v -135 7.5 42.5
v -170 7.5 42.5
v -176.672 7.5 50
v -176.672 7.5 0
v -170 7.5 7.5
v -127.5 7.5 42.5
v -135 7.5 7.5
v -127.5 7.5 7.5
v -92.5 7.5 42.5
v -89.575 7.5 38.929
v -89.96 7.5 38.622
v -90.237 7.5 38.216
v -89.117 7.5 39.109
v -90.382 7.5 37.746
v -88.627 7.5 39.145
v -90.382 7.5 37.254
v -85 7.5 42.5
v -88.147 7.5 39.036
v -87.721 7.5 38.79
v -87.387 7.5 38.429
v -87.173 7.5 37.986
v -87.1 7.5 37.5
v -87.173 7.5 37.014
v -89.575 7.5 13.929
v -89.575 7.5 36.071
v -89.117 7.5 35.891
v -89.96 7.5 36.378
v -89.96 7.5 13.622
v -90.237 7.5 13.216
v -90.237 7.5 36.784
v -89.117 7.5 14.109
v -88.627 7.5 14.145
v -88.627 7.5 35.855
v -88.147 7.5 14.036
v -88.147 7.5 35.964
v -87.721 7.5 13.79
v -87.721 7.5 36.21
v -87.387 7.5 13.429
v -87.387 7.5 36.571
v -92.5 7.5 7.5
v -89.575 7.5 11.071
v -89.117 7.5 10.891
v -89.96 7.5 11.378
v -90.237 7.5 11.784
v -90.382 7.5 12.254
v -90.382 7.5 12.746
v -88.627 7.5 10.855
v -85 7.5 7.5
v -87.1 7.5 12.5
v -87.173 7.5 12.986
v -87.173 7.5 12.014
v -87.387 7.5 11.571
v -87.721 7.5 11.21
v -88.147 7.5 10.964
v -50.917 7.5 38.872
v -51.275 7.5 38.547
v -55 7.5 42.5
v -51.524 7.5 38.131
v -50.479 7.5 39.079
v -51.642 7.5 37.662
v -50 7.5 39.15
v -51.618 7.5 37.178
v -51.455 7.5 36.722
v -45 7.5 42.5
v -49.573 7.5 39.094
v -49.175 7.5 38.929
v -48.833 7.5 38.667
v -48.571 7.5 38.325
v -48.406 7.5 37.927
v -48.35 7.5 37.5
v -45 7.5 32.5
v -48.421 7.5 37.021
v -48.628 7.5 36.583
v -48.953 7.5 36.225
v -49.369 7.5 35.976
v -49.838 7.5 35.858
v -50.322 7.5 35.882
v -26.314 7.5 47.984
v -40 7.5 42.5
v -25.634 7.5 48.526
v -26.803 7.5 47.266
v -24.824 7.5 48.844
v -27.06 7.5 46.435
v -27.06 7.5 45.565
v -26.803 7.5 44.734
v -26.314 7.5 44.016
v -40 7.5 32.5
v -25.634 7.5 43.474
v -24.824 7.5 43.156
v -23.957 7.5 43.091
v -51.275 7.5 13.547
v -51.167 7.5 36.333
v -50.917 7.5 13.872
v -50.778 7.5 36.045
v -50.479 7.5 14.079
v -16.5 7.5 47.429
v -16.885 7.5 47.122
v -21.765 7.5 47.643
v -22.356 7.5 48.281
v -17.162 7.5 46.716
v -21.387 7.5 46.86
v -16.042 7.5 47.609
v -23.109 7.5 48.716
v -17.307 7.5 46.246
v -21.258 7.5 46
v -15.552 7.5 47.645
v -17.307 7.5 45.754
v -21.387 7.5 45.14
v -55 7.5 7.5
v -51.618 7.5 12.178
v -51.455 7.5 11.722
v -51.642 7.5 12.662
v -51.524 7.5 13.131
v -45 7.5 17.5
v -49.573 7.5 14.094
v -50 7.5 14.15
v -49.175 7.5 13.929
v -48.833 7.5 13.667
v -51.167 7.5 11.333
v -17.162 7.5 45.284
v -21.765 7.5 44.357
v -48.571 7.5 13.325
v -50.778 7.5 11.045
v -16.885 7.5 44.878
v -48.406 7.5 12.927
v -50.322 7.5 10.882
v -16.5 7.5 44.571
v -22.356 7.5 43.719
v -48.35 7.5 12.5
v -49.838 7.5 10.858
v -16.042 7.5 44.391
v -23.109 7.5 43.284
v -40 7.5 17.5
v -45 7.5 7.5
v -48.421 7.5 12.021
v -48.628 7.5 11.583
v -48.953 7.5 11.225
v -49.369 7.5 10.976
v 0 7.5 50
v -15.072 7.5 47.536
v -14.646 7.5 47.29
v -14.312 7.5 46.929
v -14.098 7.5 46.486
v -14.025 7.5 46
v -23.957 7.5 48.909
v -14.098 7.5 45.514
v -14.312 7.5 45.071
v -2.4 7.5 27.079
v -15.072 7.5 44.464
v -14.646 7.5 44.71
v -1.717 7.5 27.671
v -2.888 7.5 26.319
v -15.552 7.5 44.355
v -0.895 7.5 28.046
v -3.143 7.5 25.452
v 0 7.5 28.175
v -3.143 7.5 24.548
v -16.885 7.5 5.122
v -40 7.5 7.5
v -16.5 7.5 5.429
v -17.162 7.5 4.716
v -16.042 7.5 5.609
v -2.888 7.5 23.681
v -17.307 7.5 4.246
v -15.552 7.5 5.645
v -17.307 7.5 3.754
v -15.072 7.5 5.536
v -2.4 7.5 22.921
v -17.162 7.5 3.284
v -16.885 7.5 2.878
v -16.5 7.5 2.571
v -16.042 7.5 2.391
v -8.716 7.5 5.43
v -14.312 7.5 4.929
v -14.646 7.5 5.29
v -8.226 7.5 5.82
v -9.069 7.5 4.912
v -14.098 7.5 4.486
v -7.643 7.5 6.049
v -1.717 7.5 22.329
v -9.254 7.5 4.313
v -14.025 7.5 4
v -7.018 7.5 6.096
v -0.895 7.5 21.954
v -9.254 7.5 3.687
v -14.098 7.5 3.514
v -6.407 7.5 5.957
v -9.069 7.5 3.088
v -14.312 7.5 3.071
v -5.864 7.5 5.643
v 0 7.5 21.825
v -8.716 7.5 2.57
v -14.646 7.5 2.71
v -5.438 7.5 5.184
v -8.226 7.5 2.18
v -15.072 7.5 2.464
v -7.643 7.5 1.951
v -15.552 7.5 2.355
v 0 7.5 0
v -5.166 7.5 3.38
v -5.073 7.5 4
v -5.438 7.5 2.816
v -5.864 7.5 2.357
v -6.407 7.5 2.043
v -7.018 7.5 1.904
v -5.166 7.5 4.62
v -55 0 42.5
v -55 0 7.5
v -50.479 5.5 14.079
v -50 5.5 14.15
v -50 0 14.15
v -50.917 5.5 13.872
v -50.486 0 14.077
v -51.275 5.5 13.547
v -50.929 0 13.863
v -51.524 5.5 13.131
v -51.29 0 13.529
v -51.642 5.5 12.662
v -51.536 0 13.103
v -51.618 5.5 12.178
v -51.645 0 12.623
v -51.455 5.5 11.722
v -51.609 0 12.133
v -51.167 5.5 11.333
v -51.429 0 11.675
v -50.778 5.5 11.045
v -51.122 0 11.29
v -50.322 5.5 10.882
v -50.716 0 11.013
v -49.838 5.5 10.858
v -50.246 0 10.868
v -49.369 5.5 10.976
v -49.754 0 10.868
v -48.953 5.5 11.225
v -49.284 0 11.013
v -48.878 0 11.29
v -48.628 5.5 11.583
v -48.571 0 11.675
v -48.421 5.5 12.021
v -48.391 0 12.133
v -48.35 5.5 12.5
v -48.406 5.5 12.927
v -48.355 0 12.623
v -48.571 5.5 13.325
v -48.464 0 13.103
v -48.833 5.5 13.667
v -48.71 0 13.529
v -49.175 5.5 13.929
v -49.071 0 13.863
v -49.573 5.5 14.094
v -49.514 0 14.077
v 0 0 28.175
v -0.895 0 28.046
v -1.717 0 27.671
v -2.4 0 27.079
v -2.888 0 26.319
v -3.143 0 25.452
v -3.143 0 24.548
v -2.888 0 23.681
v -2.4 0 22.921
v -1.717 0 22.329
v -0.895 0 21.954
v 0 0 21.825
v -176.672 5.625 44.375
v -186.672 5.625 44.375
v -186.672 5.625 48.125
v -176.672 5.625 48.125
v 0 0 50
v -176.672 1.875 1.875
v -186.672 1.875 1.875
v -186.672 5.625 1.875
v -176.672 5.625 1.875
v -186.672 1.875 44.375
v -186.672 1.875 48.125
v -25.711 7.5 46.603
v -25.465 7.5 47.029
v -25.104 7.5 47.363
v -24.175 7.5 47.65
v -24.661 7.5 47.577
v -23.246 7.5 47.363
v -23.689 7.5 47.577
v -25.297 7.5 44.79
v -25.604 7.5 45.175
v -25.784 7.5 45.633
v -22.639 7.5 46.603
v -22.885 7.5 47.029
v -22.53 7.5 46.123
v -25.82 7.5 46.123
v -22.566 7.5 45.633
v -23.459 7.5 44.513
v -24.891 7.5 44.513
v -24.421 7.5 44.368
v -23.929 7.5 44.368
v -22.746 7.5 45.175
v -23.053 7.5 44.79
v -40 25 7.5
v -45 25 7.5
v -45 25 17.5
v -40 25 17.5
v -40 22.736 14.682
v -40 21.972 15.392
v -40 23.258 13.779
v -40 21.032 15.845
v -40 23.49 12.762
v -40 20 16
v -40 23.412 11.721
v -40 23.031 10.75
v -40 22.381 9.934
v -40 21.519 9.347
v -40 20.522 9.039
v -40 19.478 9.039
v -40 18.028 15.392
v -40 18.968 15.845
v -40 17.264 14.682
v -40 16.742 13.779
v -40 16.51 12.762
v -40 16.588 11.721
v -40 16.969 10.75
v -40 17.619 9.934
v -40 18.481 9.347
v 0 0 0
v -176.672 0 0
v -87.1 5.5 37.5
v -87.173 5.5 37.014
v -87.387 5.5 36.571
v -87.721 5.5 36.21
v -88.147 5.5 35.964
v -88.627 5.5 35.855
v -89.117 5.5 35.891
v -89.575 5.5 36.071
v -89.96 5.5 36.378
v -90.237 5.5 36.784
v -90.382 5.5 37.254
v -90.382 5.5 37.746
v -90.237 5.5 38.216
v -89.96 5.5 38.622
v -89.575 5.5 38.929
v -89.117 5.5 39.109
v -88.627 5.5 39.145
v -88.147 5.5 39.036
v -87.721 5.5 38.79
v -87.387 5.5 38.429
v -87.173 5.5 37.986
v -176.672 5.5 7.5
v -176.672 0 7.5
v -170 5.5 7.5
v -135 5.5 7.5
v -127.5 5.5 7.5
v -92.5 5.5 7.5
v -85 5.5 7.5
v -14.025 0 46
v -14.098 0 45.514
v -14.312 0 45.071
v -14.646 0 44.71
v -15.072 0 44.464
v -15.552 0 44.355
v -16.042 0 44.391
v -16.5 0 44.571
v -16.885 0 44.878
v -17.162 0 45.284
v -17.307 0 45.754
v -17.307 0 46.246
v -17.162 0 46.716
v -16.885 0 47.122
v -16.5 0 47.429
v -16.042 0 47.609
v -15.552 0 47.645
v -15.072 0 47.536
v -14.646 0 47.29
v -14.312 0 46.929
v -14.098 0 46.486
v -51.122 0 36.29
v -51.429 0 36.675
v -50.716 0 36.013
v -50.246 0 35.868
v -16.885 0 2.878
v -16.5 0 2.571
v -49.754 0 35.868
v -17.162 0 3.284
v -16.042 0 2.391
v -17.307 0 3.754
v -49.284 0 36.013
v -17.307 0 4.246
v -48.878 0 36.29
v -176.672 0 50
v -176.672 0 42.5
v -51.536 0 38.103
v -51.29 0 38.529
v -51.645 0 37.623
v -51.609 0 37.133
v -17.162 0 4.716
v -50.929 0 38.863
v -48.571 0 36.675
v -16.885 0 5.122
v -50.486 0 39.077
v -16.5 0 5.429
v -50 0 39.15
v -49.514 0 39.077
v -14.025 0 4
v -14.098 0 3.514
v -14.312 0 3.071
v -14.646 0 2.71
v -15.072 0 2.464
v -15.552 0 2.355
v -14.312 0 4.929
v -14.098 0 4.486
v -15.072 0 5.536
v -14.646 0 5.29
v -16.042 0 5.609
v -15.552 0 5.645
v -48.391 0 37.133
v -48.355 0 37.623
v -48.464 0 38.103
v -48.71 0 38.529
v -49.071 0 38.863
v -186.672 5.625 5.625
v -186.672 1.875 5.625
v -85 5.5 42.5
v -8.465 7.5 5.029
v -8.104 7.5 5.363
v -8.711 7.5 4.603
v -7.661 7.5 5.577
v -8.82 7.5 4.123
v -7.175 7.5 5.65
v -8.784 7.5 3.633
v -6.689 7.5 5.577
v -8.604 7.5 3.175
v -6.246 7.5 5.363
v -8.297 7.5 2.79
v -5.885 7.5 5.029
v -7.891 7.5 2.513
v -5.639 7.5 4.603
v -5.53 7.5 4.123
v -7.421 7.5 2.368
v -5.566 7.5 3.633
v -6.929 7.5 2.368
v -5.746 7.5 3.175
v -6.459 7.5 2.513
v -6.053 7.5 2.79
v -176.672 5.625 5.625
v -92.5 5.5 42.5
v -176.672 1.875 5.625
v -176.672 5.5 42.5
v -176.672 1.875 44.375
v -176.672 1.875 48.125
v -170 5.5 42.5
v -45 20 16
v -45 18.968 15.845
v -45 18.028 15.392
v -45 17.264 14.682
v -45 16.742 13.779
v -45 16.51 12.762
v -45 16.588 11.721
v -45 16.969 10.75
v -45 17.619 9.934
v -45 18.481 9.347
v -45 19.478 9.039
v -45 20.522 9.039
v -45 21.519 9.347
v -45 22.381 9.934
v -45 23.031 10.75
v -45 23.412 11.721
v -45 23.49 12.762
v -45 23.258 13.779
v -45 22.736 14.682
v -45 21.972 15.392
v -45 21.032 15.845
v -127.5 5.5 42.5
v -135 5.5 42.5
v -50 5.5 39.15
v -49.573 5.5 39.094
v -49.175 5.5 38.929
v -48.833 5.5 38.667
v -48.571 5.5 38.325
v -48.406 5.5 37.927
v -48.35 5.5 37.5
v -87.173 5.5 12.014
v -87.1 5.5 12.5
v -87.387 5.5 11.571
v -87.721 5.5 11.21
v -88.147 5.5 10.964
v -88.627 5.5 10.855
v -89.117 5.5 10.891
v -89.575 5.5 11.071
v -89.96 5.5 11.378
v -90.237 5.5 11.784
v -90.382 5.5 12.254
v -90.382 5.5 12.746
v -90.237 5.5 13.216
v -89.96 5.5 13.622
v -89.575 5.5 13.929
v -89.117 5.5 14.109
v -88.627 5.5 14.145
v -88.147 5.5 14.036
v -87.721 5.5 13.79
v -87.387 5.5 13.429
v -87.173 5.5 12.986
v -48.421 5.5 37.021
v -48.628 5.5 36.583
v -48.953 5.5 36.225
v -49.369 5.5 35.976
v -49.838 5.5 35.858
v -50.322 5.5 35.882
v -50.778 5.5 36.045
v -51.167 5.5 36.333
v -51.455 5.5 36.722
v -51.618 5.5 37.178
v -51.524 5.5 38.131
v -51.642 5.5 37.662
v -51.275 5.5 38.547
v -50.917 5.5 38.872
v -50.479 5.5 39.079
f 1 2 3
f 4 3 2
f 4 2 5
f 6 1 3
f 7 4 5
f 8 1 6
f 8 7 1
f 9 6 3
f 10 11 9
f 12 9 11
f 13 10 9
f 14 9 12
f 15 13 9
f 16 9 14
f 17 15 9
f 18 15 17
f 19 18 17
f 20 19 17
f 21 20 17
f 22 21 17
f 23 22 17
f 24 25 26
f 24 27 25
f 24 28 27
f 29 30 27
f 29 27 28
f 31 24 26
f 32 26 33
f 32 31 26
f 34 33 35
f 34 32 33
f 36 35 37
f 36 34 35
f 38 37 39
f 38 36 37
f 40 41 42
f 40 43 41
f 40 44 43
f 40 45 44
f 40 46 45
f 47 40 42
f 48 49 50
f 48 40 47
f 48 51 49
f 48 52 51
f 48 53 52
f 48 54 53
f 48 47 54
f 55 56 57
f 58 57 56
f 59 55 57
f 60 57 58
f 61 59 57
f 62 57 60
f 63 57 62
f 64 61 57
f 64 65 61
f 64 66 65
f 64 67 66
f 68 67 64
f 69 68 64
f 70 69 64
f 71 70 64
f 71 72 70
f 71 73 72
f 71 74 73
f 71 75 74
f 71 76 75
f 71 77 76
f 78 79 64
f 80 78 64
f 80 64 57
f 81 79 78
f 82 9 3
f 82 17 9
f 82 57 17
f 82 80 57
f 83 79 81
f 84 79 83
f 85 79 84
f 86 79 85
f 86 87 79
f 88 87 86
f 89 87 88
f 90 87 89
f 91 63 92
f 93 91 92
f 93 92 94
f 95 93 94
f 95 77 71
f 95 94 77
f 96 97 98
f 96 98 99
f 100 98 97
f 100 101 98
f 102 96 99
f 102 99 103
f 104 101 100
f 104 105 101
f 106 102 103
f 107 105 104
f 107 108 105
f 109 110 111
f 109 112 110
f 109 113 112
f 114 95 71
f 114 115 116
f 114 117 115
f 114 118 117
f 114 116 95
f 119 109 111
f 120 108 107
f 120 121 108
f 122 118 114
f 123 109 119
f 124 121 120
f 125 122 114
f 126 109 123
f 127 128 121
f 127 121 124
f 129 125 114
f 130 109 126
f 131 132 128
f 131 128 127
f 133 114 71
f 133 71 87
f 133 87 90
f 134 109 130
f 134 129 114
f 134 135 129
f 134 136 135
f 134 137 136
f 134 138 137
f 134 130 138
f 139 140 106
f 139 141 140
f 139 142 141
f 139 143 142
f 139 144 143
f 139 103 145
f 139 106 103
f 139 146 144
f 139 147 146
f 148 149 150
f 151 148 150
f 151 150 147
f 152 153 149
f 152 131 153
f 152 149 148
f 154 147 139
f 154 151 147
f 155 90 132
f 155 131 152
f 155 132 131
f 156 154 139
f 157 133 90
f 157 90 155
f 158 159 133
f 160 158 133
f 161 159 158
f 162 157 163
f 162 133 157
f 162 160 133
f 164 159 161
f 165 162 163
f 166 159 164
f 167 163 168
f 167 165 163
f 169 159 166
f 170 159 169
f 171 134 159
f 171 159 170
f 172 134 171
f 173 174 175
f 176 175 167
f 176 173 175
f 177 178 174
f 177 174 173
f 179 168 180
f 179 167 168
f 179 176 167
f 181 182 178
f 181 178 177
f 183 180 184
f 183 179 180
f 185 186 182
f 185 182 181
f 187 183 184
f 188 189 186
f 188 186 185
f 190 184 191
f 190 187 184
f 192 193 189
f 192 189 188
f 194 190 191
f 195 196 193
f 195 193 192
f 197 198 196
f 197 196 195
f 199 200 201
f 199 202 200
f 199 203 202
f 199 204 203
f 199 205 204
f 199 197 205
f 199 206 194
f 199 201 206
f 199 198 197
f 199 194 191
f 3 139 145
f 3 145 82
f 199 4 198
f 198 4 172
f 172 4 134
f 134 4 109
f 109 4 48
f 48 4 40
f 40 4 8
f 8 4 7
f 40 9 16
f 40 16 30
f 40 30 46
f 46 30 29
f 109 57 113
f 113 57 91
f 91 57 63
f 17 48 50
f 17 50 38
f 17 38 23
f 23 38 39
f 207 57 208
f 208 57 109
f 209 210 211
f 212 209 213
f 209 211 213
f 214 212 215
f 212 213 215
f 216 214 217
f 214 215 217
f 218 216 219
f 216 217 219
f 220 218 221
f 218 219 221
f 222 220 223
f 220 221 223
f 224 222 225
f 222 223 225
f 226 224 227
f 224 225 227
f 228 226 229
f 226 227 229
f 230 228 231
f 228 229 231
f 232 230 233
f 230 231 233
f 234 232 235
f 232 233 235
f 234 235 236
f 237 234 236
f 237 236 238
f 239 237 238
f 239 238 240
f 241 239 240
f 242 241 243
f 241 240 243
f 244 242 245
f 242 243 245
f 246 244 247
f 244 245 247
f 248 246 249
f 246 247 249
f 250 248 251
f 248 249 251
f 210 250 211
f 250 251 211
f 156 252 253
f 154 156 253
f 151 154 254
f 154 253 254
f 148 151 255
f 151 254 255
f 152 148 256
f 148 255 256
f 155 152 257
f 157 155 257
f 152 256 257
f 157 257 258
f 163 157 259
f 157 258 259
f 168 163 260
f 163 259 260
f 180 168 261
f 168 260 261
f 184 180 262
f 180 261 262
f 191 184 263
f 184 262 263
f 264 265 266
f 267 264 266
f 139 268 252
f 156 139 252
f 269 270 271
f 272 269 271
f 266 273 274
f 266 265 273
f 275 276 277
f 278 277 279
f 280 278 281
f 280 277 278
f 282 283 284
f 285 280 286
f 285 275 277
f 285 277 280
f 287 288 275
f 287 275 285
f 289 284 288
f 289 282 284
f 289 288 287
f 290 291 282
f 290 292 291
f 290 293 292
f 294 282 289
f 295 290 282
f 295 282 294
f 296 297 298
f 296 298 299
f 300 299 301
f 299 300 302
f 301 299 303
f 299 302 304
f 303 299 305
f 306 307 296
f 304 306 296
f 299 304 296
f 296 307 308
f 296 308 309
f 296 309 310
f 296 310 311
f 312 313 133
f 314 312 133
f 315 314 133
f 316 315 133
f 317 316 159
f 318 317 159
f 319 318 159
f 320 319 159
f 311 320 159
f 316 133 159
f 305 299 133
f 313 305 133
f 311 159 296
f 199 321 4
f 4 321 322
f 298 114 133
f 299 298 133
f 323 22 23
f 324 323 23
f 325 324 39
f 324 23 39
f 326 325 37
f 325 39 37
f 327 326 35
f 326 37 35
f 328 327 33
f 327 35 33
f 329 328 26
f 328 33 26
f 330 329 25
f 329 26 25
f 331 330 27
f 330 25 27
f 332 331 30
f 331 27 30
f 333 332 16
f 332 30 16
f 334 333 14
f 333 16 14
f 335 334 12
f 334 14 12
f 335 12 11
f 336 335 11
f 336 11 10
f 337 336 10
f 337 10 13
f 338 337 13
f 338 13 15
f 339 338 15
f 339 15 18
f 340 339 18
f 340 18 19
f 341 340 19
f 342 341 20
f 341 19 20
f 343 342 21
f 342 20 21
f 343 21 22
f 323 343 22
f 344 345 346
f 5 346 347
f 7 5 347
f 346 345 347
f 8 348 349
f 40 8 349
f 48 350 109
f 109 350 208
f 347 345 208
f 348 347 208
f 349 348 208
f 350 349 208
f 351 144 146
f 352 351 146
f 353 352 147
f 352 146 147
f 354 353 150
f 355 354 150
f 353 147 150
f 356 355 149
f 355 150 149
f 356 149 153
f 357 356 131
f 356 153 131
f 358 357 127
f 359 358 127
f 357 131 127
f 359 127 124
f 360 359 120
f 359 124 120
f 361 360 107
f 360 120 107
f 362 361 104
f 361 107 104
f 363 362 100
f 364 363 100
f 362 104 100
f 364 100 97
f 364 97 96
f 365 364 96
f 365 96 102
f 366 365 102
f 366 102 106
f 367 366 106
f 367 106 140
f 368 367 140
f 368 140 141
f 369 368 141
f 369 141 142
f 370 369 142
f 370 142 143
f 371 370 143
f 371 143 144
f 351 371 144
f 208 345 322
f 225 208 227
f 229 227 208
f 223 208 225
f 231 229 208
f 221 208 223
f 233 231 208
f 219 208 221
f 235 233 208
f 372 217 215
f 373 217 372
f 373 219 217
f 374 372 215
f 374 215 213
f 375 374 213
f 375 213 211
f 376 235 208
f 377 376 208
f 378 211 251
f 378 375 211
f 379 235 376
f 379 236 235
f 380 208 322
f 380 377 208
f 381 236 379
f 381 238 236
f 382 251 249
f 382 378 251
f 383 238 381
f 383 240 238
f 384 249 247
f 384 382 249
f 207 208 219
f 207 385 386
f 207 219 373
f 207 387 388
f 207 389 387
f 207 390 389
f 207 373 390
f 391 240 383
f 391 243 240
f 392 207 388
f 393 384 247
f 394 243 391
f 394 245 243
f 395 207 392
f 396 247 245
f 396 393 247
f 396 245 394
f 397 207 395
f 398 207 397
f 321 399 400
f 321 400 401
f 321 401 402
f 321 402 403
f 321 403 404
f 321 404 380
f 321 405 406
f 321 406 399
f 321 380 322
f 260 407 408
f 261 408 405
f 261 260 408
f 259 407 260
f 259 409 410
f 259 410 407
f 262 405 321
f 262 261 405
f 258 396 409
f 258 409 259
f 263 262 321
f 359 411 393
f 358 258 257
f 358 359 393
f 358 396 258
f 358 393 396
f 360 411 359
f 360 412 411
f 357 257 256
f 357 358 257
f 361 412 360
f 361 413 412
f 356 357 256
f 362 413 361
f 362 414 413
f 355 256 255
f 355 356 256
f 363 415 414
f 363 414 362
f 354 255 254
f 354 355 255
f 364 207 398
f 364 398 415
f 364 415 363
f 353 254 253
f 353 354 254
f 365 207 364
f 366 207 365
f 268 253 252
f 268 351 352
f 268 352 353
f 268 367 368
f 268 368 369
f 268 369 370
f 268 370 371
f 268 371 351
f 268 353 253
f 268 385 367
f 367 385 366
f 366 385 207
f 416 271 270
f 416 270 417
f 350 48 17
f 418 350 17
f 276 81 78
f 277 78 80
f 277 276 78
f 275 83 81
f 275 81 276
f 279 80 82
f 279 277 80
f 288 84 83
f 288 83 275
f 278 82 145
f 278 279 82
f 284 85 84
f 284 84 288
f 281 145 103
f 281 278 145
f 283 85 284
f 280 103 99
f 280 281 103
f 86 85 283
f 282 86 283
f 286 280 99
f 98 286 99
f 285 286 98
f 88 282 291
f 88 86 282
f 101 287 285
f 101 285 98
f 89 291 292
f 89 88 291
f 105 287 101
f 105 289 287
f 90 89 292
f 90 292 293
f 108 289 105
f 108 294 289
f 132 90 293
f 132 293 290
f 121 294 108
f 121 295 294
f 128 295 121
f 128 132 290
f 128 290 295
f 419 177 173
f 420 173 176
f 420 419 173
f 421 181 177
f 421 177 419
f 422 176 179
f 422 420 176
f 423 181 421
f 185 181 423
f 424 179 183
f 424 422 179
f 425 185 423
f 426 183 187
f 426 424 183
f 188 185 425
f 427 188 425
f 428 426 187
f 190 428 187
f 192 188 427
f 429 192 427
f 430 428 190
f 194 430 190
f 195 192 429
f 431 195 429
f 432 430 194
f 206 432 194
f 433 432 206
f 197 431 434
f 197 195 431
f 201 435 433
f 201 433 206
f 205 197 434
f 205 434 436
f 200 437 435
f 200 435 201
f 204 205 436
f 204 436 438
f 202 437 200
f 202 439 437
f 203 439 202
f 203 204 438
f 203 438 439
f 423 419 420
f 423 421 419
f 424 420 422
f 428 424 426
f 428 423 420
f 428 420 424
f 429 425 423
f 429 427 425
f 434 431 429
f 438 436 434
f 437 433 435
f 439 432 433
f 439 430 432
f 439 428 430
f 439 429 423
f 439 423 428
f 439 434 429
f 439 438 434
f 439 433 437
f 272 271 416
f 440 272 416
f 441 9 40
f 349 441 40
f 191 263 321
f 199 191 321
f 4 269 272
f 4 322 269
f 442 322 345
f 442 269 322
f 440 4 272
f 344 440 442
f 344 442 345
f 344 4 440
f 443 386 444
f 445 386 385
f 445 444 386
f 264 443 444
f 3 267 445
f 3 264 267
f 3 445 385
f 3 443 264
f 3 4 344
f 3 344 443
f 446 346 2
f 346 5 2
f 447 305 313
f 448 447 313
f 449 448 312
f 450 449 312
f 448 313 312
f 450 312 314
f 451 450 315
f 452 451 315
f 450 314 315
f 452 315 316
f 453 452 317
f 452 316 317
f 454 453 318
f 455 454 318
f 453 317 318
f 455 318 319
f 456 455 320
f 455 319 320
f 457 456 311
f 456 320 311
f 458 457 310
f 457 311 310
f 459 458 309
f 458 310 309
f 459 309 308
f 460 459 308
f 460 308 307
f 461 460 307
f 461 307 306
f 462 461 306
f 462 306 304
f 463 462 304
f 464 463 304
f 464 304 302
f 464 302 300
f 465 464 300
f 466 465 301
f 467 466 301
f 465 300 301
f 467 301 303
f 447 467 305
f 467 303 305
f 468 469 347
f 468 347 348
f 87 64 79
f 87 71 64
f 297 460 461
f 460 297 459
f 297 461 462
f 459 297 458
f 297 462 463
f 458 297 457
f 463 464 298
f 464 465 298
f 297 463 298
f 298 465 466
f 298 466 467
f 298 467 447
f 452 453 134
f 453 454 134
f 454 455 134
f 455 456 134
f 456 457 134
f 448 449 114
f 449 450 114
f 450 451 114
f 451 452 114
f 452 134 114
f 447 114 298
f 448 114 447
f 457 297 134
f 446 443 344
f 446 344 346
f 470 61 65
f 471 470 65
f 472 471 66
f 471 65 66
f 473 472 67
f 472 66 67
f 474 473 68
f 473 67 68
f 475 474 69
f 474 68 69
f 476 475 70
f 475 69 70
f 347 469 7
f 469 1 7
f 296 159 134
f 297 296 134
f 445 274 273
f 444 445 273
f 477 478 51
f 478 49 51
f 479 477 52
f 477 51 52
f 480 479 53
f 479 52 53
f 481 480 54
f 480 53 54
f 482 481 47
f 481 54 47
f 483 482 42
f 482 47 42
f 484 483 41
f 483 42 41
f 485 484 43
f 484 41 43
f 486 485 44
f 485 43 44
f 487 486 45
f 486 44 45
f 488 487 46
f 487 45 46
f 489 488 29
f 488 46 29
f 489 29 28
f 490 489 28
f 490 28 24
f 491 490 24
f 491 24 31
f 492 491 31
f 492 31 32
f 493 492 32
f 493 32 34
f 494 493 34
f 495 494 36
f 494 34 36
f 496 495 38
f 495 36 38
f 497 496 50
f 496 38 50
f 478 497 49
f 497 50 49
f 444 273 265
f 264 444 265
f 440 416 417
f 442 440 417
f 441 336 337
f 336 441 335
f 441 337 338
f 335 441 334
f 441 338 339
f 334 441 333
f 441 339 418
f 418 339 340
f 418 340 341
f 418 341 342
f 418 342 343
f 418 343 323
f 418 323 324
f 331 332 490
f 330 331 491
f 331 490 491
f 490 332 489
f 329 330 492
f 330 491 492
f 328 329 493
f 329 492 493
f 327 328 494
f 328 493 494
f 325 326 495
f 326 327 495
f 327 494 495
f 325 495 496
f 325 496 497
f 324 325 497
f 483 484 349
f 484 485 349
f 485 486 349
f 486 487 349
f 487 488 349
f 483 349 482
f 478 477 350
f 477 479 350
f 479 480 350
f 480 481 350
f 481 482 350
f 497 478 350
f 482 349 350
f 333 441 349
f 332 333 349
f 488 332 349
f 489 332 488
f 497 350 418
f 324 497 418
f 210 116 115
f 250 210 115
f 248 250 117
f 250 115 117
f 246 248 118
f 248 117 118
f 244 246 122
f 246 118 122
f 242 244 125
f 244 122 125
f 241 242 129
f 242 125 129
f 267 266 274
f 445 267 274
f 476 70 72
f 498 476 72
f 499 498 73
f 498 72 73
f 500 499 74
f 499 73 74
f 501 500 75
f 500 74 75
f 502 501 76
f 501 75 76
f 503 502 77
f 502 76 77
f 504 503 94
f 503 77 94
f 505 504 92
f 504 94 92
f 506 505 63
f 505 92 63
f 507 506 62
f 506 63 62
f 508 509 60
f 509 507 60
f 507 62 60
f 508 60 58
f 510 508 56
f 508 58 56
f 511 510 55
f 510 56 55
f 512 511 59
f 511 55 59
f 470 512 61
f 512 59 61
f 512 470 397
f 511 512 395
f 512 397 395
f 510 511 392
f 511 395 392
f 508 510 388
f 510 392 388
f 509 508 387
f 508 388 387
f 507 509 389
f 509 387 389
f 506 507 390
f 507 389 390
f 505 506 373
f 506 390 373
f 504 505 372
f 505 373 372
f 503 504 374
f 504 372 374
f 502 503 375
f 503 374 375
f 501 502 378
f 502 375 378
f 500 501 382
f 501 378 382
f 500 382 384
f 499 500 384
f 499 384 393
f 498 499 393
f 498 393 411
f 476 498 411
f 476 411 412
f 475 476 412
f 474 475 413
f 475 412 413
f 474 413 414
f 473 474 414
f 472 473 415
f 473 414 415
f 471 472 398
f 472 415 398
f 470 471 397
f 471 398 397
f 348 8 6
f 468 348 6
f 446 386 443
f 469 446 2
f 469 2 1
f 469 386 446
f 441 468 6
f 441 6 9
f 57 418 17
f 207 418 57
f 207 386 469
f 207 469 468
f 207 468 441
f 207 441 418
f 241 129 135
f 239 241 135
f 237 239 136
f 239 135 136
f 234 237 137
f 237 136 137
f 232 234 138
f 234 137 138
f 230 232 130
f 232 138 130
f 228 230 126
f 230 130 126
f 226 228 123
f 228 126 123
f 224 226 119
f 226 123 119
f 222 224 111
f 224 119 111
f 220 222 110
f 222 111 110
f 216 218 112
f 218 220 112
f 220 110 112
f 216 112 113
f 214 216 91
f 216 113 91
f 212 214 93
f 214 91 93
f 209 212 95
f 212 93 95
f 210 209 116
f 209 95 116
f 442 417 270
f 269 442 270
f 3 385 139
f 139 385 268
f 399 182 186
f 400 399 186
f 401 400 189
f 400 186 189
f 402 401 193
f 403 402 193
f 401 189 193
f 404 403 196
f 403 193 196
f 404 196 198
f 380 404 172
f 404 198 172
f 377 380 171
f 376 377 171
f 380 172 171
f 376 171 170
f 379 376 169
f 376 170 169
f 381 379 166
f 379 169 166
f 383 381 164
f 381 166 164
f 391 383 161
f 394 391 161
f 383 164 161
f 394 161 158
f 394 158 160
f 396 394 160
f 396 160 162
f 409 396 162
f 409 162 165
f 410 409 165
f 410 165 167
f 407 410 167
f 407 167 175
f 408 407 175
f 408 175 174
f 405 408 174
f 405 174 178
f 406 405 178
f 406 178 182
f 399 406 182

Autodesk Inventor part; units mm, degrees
ref_plane "YZ Plane" through (0, 0, 0) normal (1, 0, 0) x (0, 1, 0)
ref_plane "XZ Plane" through (0, 0, 0) normal (0, 1, 0) x (-1, 0, 0)
ref_plane "XY Plane" through (0, 0, 0) normal (0, 0, 1) x (1, 0, 0)
sketch "Sketch1" plane through (0, 0, 0) normal (0, 1, 0) x (-1, 0, 0)
  line L0 (0, 0) -> (50, 0)
  line L1 (50, 0) -> (50, 50)
  line L2 (50, 50) -> (0, 50)
  line L3 (0, 50) -> (0, 0)
  line L4 (50, 50) -> (290, 50)
  line L5 (290, 50) -> (290, 42.5)
  line L6 (290, 42.5) -> (50, 42.5)
  line L7 (50, 42.5) -> (50, 50)
  line L8 (50, 0) -> (290, 0)
  line L9 (290, 0) -> (290, 7.5)
  line L10 (290, 7.5) -> (50, 7.5)
  line L11 (50, 7.5) -> (50, 0)
  dimension "d0" = 50
  dimension "d1" = 50
  dimension "d2" = 240
  dimension "d3" = 7.5
  dimension "d4" = 7.5
extrude "Extrusion1" add sketch "Sketch1" along normal blind 7.5
sketch "Sketch2" plane through (0, 7.5, 0) normal (0, 1, 0) x (1, 0, 0)
  line L0 (0, -50) -> (0, 0) projected
  point P0 (0, -25)
hole "Hole1" at (0, 7.5, 25) direction (0, -1, 0) diameter 6.35 end through all
sketch "Sketch3" plane through (0, 7.5, 0) normal (0, 1, 0) x (1, 0, 0)
  line L0 (-3.175, -50) -> (-3.175, 0) construction
  line L1 (-3.175, -50) -> (-28.175, -50) construction
  line L2 (-28.175, -50) -> (-28.175, 0) construction
  line L3 (-28.175, 0) -> (-3.175, 0) construction
  point P0 (0, 0)
  point P1 (-7.175, -4)
  point P2 (-24.175, -46)
  dimension "d14" = 25
hole "Hole2" at (-7.175, 7.5, 4) at (-24.175, 7.5, 46) direction (0, -1, 0) diameter 3.3 end through all
sketch "Sketch4" plane through (0, 7.5, 0) normal (0, 1, 0) x (1, 0, 0)
  arc A0 (0, -21.825) -> (0, -28.175) centre (0, -25) ccw construction
  line L0 (-3.175, -25) -> (-28.175, -25) construction
  line L1 (-3.175, -25) -> (21.825, -25) construction
  line L2 (-290, -50) -> (0, -50) construction
  line L3 (-28.175, -50) -> (-28.175, 0) construction
  line L4 (-50, -7.5) -> (-50, -42.5) construction
  line L5 (-50, -42.5) -> (-45, -42.5) construction
  line L6 (-45, -42.5) -> (-45, -32.5) construction
  line L7 (-45, -32.5) -> (-50, -32.5) construction
  line L8 (-50, -32.5) -> (-50, -42.5) construction
  line L9 (-45, -32.5) -> (-40, -32.5)
  line L10 (-40, -32.5) -> (-40, -42.5)
  line L11 (-40, -42.5) -> (-45, -42.5)
  line L12 (-45, -42.5) -> (-45, -32.5)
  point P0 (0, 0)
  dimension "d22" = 25
  dimension "d23" = 180
  dimension "d24" = 5
  dimension "d25" = 10
  dimension "d26" = 5
extrude "Extrusion2" add sketch "Sketch4" along normal blind 17.5
sketch "Sketch5" plane through (0, 7.5, 0) normal (0, 1, 0) x (1, 0, 0)
  line L0 (-85, -7.5) -> (-85, -42.5)
  line L1 (-127.5, -7.5) -> (-127.5, -42.5)
  line L2 (-92.5, -42.5) -> (-92.5, -7.5)
  line L3 (-135, -7.5) -> (-170, -7.5) construction
  line L4 (-170, -7.5) -> (-170, -42.5) construction
  line L5 (-170, -42.5) -> (-135, -42.5) construction
  line L6 (-135, -42.5) -> (-135, -7.5) construction
  line L7 (-177.5, -7.5) -> (-212.5, -7.5) construction
  line L8 (-212.5, -7.5) -> (-212.5, -42.5) construction
  line L9 (-212.5, -42.5) -> (-177.5, -42.5) construction
  line L10 (-177.5, -42.5) -> (-177.5, -7.5) construction
  line L11 (-220, -7.5) -> (-255, -7.5) construction
  line L12 (-255, -7.5) -> (-255, -42.5) construction
  line L13 (-255, -42.5) -> (-220, -42.5) construction
  line L14 (-220, -42.5) -> (-220, -7.5) construction
  line L15 (-85, -7.5) -> (-92.5, -7.5) construction
  line L16 (-92.5, -7.5) -> (-92.5, -42.5) construction
  line L17 (-92.5, -42.5) -> (-85, -42.5) construction
  line L18 (-85, -42.5) -> (-85, -7.5) construction
  line L19 (-127.5, -7.5) -> (-135, -7.5) construction
  line L20 (-135, -7.5) -> (-135, -42.5) construction
  line L21 (-135, -42.5) -> (-127.5, -42.5) construction
  line L22 (-127.5, -42.5) -> (-127.5, -7.5) construction
  line L23 (-170, -7.5) -> (-177.5, -7.5) construction
  line L24 (-177.5, -7.5) -> (-177.5, -42.5) construction
  line L25 (-177.5, -42.5) -> (-170, -42.5) construction
  line L26 (-170, -42.5) -> (-170, -7.5) construction
  line L27 (-212.5, -7.5) -> (-220, -7.5) construction
  line L28 (-220, -7.5) -> (-220, -42.5) construction
  line L29 (-220, -42.5) -> (-212.5, -42.5) construction
  line L30 (-212.5, -42.5) -> (-212.5, -7.5) construction
  line L31 (-220, -7.5) -> (-212.5, -7.5)
  line L32 (-212.5, -7.5) -> (-212.5, -42.5)
  line L33 (-212.5, -42.5) -> (-220, -42.5)
  line L34 (-220, -42.5) -> (-220, -7.5)
  line L35 (-177.5, -7.5) -> (-170, -7.5)
  line L36 (-170, -7.5) -> (-170, -42.5)
  line L37 (-170, -42.5) -> (-177.5, -42.5)
  line L38 (-177.5, -42.5) -> (-177.5, -7.5)
  line L39 (-135, -7.5) -> (-127.5, -7.5)
  line L40 (-127.5, -7.5) -> (-127.5, -42.5)
  line L41 (-127.5, -42.5) -> (-135, -42.5)
  line L42 (-135, -42.5) -> (-135, -7.5)
  line L43 (-92.5, -7.5) -> (-85, -7.5)
  line L44 (-85, -7.5) -> (-85, -42.5)
  line L45 (-85, -42.5) -> (-92.5, -42.5)
  line L46 (-92.5, -42.5) -> (-92.5, -7.5)
  point P0 (0, 0)
  point P1 (-50, -7.5)
  dimension "d30" = 35
  dimension "d31" = 35
  dimension "d32" = 35
  dimension "d33" = 35
  dimension "d34" = 35
  dimension "d35" = 35
extrude "Extrusion3" add sketch "Sketch5" against normal blind 2
sketch "Sketch6" plane through (0, 7.5, 0) normal (0, 1, 0) x (1, 0, 0)
  line L0 (-290, 0) -> (-290, -7.5) projected
  line L1 (-290, -50) -> (0, -50) projected
  line L2 (-290, 0) -> (-280, 0)
  line L3 (-280, 0) -> (-280, -50)
  line L4 (-280, -50) -> (-290, -50)
  line L5 (-290, -50) -> (-290, 0)
  point P0 (0, 0)
  dimension "d38" = 10
extrude "Extrusion4" cut sketch "Sketch6" against normal blind 7.5
sketch "Sketch7" plane through (-280, 7.5, 0) normal (-1, 0, 0) x (0, 0, 1)
  point P0 (0, -7.5)
sketch "Sketch8" plane through (-280, 7.5, 0) normal (-1, 0, 0) x (0, 0, 1)
  line L0 (-25, 0) -> (75, 0)
  line L1 (75, 0) -> (75, -7.5)
  line L2 (75, -7.5) -> (-25, -7.5)
  line L3 (-25, -7.5) -> (-25, 0)
  line L4 (-25, 0) -> (75, 0)
  line L5 (75, 0) -> (75, -10)
  line L6 (75, -10) -> (-25, -10)
  line L7 (-25, -10) -> (-25, 0)
  point P0 (0, -7.5)
  dimension "d41" = 100
  dimension "d42" = 10
extrude "Extrusion5" add sketch "Sketch8" along normal blind 7.5
sketch "Sketch9" plane through (-287.5, 7.5, 0) normal (-1, 0, 0) x (0, 0, 1)
  line L0 (75, 0) -> (-25, 0) projected
  line L1 (-25, -10) -> (75, -10) projected
  line L2 (-25, 0) -> (-17.5, 0)
  line L3 (-17.5, 0) -> (-17.5, -10)
  line L4 (-17.5, -10) -> (-25, -10)
  line L5 (-25, -10) -> (-25, 0)
  line L6 (75, 0) -> (67.5, 0)
  line L7 (67.5, 0) -> (67.5, -10)
  line L8 (67.5, -10) -> (75, -10)
  line L9 (75, -10) -> (75, 0)
  point P0 (0, -7.5)
  dimension "d45" = 7.5
  dimension "d46" = 7.5
extrude "Extrusion6" add sketch "Sketch9" along normal blind 25 contours L9 L1 L7 L0 | L3 L1 L5 L0
sketch "Sketch10" plane through (-287.5, -2.5, -17.5) normal (0, 0, 1) x (1, 0, 0)
  line L0 (0, 0) -> (-25, 0) construction
  line L1 (0, 0) -> (-3, 0) construction
  line L2 (-3, 0) -> (-6.2, 0)
  line L3 (-6.2, 0) -> (-6.2, 2.1)
  line L4 (-6.2, 2.1) -> (-3, 2.1)
  line L5 (-3, 2.1) -> (-3, 0)
  line L6 (-6.2, 2.1) -> (-11.7, 2.1) construction
  line L7 (-11.7, 2.1) -> (-11.7, 5.4) construction
  point P0 (287.5, 2.5)
  dimension "d49" = 3
  dimension "d50" = 3.2
  dimension "d51" = 2.1
  dimension "d52" = 5.5
  dimension "d53" = 3.3
extrude "Extrusion7" add sketch "Sketch10" along normal blind 92.5
sketch "Sketch11" plane through (-287.5, -2.5, -17.5) normal (0, 0, 1) x (1, 0, 0)
  line L0 (-6.2, 2.1) -> (-3, 2.1) construction
  line L1 (-6.2, 2.1) -> (-11.7, 2.1) construction
  line L2 (-11.7, 2.1) -> (-11.7, 5.4) construction
  circle A0 centre (-11.7, 5.4) radius 2.125
  point P0 (287.5, 2.5)
  dimension "d56" = 5.5
  dimension "d57" = 3.3
  dimension "d58" = 4.25
extrude "Extrusion8" cut sketch "Sketch11" along normal mid plane 241
sketch "Sketch12" plane through (-287.5, -2.5, -17.5) normal (0, 0, 1) x (1, 0, 0)
  circle A0 centre (-11.7, 5.4) radius 2.125 construction
  line L0 (-11.7, 5.4) -> (-11.7, 0.96) construction
  line L1 (-11.7, 0.96) -> (-16.7, 0.96) construction
  line L2 (-6.2, 0) -> (-25, 0) projected
  line L3 (-16.7, 0.96) -> (-19.2, 0.96)
  line L4 (-19.2, 0.96) -> (-19.2, 0)
  line L5 (-19.2, 0) -> (-16.7, 0)
  line L6 (-16.7, 0) -> (-16.7, 0.96)
  point P0 (287.5, 2.5)
  dimension "d61" = 4.44
  dimension "d62" = 5
  dimension "d63" = 2.5
extrude "Extrusion9" add sketch "Sketch12" along normal blind 91.25
sketch "Sketch13" plane through (-293.7, -0.4, -17.5) normal (0, 1, 0) x (1, 0, 0)
  line L0 (3.2, 0) -> (3.2, -85) construction
  line L1 (3.2, 0) -> (3.2, -30) construction
  line L2 (0, 0) -> (0, -85) construction
  line L3 (3.2, -30) -> (0, -30) construction
  line L4 (0, -30) -> (0, -36.35) construction
  line L5 (0, -36.35) -> (3.2, -36.35) construction
  line L6 (3.2, -36.35) -> (3.2, -30) construction
  line L7 (0, -30) -> (3.2, -30)
  line L8 (3.2, -30) -> (3.2, -36.35)
  line L9 (3.2, -36.35) -> (0, -36.35)
  line L10 (0, -36.35) -> (0, -30)
  point P0 (293.7, -17.5)
  dimension "d66" = 30
  dimension "d67" = 6.35
extrude "Extrusion10" add sketch "Sketch13" along normal blind 3.8
sketch "Sketch14" plane through (0, 7.5, 0) normal (0, 1, 0) x (1, 0, 0)
  line L0 (-287.5, 17.5) -> (-287.5, -67.5) projected
  line L1 (-287.5, 17.5) -> (-285, 17.5)
  line L2 (-285, 17.5) -> (-285, -67.5)
  line L3 (-285, -67.5) -> (-287.5, -67.5)
  line L4 (-287.5, -67.5) -> (-287.5, 17.5)
  point P0 (0, 0)
  dimension "d70" = 2.5
extrude "Extrusion11" cut sketch "Sketch14" against normal blind 14.55
sketch "Sketch15" plane through (0, 7.5, 0) normal (0, 1, 0) x (1, 0, 0)
  line L0 (-312.5, 17.5) -> (-312.5, 25) projected
  line L1 (-280, -75) -> (-312.5, -75) projected
  line L2 (-312.5, 25) -> (-306.6488, 25)
  line L3 (-306.6488, 25) -> (-306.6488, -75)
  line L4 (-306.6488, -75) -> (-312.5, -75)
  line L5 (-312.5, -75) -> (-312.5, 25)
  point P0 (0, 0)
extrude "Extrusion12" cut sketch "Sketch15" against normal blind 14.55
fillet "Fillet1" radius 0.1 1 edges at (-301.325, 2.9, -17.5)
fillet "Fillet2" radius 0.1 1 edges at (-301.325, 2.9, 67.5)
fillet "Fillet3" radius 3.25 1 edges at (-280, 2.5, 75)
fillet "Fillet4" radius 3.25 1 edges at (-285, 2.5, 67.5)
fillet "Fillet5" radius 3.25 1 edges at (-280, 2.5, -25)
fillet "Fillet6" radius 3.25 1 edges at (-285, 2.5, -17.5)
sketch "Sketch16" plane through (0, 7.5, 0) normal (0, 1, 0) x (1, 0, 0)
  line L0 (-220, -42.5) -> (-220, -7.5) construction
  line L1 (-220, -42.5) -> (-280, -42.5) construction
  line L2 (-220, -7.5) -> (-255, -7.5) construction
  line L3 (-255, -7.5) -> (-255, -42.5) construction
  line L4 (-255, -42.5) -> (-220, -42.5) construction
  line L5 (-220, -42.5) -> (-220, -7.5) construction
  line L6 (-280, -7.5) -> (-280, 0) projected
  line L7 (-280, -7.5) -> (-270, -7.5)
  line L8 (-270, -7.5) -> (-270, -42.5)
  line L9 (-270, -42.5) -> (-280, -42.5)
  line L10 (-280, -42.5) -> (-280, -7.5)
  point P0 (0, 0)
  dimension "d81" = 35
  dimension "d82" = 10
extrude "Extrusion13" add sketch "Sketch16" against normal blind 2
sketch "Sketch17" plane through (0, 7.5, 0) normal (0, 1, 0) x (1, 0, 0)
  point P0 (0, 0)
sketch "Sketch18" plane through (0, 7.5, 0) normal (0, 1, 0) x (1, 0, 0)
  line L0 (-270, -7.5) -> (-270, -42.5) construction
  line L1 (-285, -64.25) -> (-285, 14.25) construction
  line L2 (-280, -7.5) -> (-280, 0) construction
  line L3 (-270, -7.5) -> (-280, -7.5) construction
  line L4 (-275, -7.5) -> (-275, -42.5) construction
  line L5 (-50, -42.5) -> (-280, -42.5) construction
  circle A0 centre (-275, -12.5) radius 1.8 construction
  circle A1 centre (-275, -37.5) radius 1.8 construction
  circle A2 centre (-275, -12.5) radius 1.8
  circle A3 centre (-275, -37.5) radius 1.8
  point P0 (0, 0)
  dimension "d85" = 3.6
  dimension "d86" = 3.6
hole "Hole3" at (-275, 7.5, 12.5) at (-275, 7.5, 37.5) direction (0, -1, 0) diameter 3.3 depth 15 tip angle 118
sketch "Sketch19" plane through (0, 7.5, 0) normal (0, 1, 0) x (1, 0, 0)
  circle A0 centre (-275, -12.5) radius 1.65 construction
  line L0 (-275, -12.5) -> (-212.5, -12.5) construction
  line L1 (-212.5, -7.5) -> (-212.5, -42.5) construction
  circle A1 centre (-275, -37.5) radius 1.65 construction
  line L2 (-275, -37.5) -> (-212.5, -37.5) construction
  line L3 (-220, -42.5) -> (-220, -7.5) construction
  line L4 (-220, -12.5) -> (-212.5, -12.5) construction
  line L5 (-216.25, -12.5) -> (-216.25, -37.5) construction
  point P0 (0, 0)
hole "Hole4" at (-216.25, 7.5, 12.5) at (-216.25, 7.5, 37.5) direction (0, -1, 0) diameter 3.3 depth 15 tip angle 118
sketch "Sketch20" plane through (-45, 7.5, 32.5) normal (-1, 0, 0) x (0, 0, 1)
  line L0 (10, 17.5) -> (0, 17.5) construction
  line L1 (5, 17.5) -> (5, -0.1335) construction
  line L2 (10, 0) -> (10, 17.5) construction
  line L3 (10, 12.5) -> (5, 12.5) construction
  circle A0 centre (5, 12.5) radius 3
  point P0 (-32.5, -7.5)
  dimension "d101" = 6
extrude "Extrusion14" cut sketch "Sketch20" against normal blind 20
sketch "Sketch21" plane through (0, 7.5, 0) normal (0, 1, 0) x (1, 0, 0)
  line L0 (-306.6488, 17.5) -> (-306.6488, -67.5) projected
  line L1 (-306.6488, 17.5) -> (-288.25, 17.5) projected
  line L2 (-306.6488, -67.5) -> (-288.25, -67.5)
  line L3 (-288.25, -67.5) -> (-288.25, 17.5)
  line L4 (-288.25, 17.5) -> (-306.6488, 17.5)
  line L5 (-306.6488, 17.5) -> (-306.6488, -67.5)
  point P0 (0, 0)
extrude "Extrusion15" cut sketch "Sketch21" against normal blind 10
sketch "Sketch22" plane through (0, 7.5, 0) normal (0, 1, 0) x (1, 0, 0)
  line L0 (-280, -50) -> (0, -50) projected
  line L1 (0, 0) -> (-280, 0) projected
  line L2 (-280, -50) -> (-270.5687, -50)
  line L3 (-270.5687, -50) -> (-270.5687, 0)
  line L4 (-270.5687, 0) -> (-280, 0)
  line L5 (-280, 0) -> (-280, -50)
  line L6 (-50, -42.5) -> (-280, -42.5) projected
  line L7 (-219.3019, -42.5) -> (-213.3073, -42.5)
  line L8 (-213.3073, -42.5) -> (-213.3073, -8.284)
  line L9 (-213.3073, -8.284) -> (-219.3019, -8.284)
  line L10 (-219.3019, -8.284) -> (-219.3019, -42.5)
extrude "Extrusion16" add sketch "Sketch22" against normal blind 2
sketch "Sketch23" plane through (-306.6488, -2.5, -25) normal (0, 0, -1) x (-1, 0, 0)
  circle A0 centre (-7.4488, 5.4) radius 2.125 projected
  circle A1 centre (-7.4488, 5.4) radius 2
  circle A2 centre (-7.4488, 5.4) radius 2.4429
  point P0 (-306.6488, 2.5)
  dimension "d108" = 4
extrude "Extrusion17" add sketch "Sketch23" against normal blind 100 contours A0 | A2
sketch "Sketch24" plane through (0, 7.5, 0) normal (0, 1, 0) x (1, 0, 0)
  line L0 (-288.25, -67.5) -> (-306.6488, -67.5) projected
  arc A0 (-285, 14.25) -> (-288.25, 17.5) centre (-288.25, 14.25) ccw projected
  line L1 (-306.6488, -67.5) -> (-288.25, -67.5)
  line L2 (-288.25, -67.5) -> (-288.25, 17.5)
  line L3 (-288.25, 17.5) -> (-306.6488, 17.5)
  line L4 (-306.6488, 17.5) -> (-306.6488, -67.5)
  point P0 (0, 0)
extrude "Extrusion18" cut sketch "Sketch24" against normal blind 100
sketch "Sketch25" plane through (0, 7.5, 0) normal (0, 1, 0) x (1, 0, 0)
  line L0 (-50, -42.5) -> (-280, -42.5) projected
  line L1 (-280, -7.5) -> (-50, -7.5) projected
  line L2 (-50, -42.5) -> (-55, -42.5)
  line L3 (-55, -42.5) -> (-55, -7.5)
  line L4 (-55, -7.5) -> (-50, -7.5)
  line L5 (-50, -7.5) -> (-50, -42.5)
  point P0 (0, 0)
  dimension "d113" = 5
extrude "Extrusion19" add sketch "Sketch25" against normal blind 2
sketch "Sketch26" plane through (0, 7.5, 0) normal (0, 1, 0) x (1, 0, 0)
  line L0 (-55, -42.5) -> (-85, -42.5) construction
  line L1 (-55, -42.5) -> (-50, -42.5) construction
  line L2 (-55, -42.5) -> (-50, -42.5) construction
  line L3 (-50, -42.5) -> (-50, -7.5) construction
  line L4 (-50, -42.5) -> (-50, -7.5) construction
  circle A0 centre (-50, -37.5) radius 1.65 construction
  circle A1 centre (-50, -12.5) radius 1.65 construction
  circle A2 centre (-50, -37.5) radius 1.65
  circle A3 centre (-50, -12.5) radius 1.65
  line L5 (-50, -37.5) -> (-92.5, -37.5) construction
  line L6 (-92.5, -42.5) -> (-92.5, -7.5) construction
  line L7 (-50, -12.5) -> (-92.5, -12.5) construction
  line L8 (-92.5, -37.5) -> (-85, -37.5) construction
  line L9 (-85, -7.5) -> (-85, -42.5) construction
  line L10 (-88.75, -37.5) -> (-88.75, -12.5) construction
  circle A4 centre (-88.75, -37.5) radius 1.65
  circle A5 centre (-88.75, -12.5) radius 1.65
  point P0 (0, 0)
  dimension "d116" = 3.3
  dimension "d117" = 3.3
  dimension "d118" = 3.3
  dimension "d119" = 3.3
extrude "Extrusion20" cut sketch "Sketch26" against normal blind 2
sketch "Sketch27" plane through (0, 5.5, 0) normal (0, -1, 0) x (1, 0, 0)
  line L0 (-50, 7.5) -> (-55, 7.5) projected
  line L1 (-55, 7.5) -> (-46.6169, 7.5)
  line L2 (-46.6169, 7.5) -> (-46.6169, 42.5)
  line L3 (-46.6169, 42.5) -> (-55, 42.5)
  line L4 (-55, 42.5) -> (-55, 7.5)
  point P0 (0, 0)
extrude "Extrusion21" add sketch "Sketch27" along normal blind 5.5
sketch "Sketch28" plane through (0, 7.5, 0) normal (0, 1, 0) x (1, 0, 0)
  circle A0 centre (-50, -12.5) radius 1.65 projected
  circle A1 centre (-50, -37.5) radius 1.65 projected
  point P0 (0, 0)
hole "Hole5" at (-50, 7.5, 12.5) at (-50, 7.5, 37.5) direction (0, -1, 0) diameter 3.3 depth 8 tip angle 118
sketch "Sketch29" plane through (0, 7.5, 0) normal (0, 1, 0) x (1, 0, 0)
  circle A0 centre (-7.175, -4) radius 1.65 construction
  circle A1 centre (-24.175, -46) radius 1.65 construction
  line L0 (-7.175, -4) -> (-24.175, -46) construction
  line L1 (-7.175, -4) -> (-7.175, -46) construction
  line L2 (-7.175, -46) -> (-24.175, -46) construction
  line L3 (-7.175, -25) -> (-25.825, -25) construction
  line L4 (-25.825, -25) -> (-25.825, -46) construction
  line L5 (-16.5, -25) -> (-25.825, -25) construction
  line L6 (-24.175, -46) -> (-24.175, -25) construction
  line L7 (-15.675, -46) -> (-15.675, -4) construction
  line L8 (-40, -32.5) -> (-40, -42.5) construction
  line L9 (-40, -42.5) -> (-24.175, -42.5) construction
  line L10 (-24.175, -42.5) -> (-24.175, -46) construction
  line L11 (-15.675, -25) -> (-15.675, -46) construction
  line L12 (-15.675, -46) -> (-15.675, -4) construction
  circle A2 centre (-15.675, -46) radius 1.65 construction
  circle A3 centre (-15.675, -46) radius 1.65
  circle A4 centre (-15.675, -4) radius 1.65
  point P0 (0, 0)
  dimension "d131" = 42
  dimension "d132" = 17
  dimension "d133" = 21
  dimension "d135" = 8.5
  dimension "d136" = 15.825
  dimension "d137" = 3.5
  dimension "d138" = 21
  dimension "d139" = 3.3
  dimension "d140" = 3.3
  dimension "d141" = 3.3
extrude "Extrusion22" cut sketch "Sketch29" against normal blind 10
sketch "Sketch30" plane through (0, 7.5, 0) normal (0, 1, 0) x (1, 0, 0)
  circle A0 centre (-7.175, -4) radius 1.65 projected
  circle A1 centre (-7.175, -4) radius 2.1021
  circle A2 centre (-24.175, -46) radius 1.65 projected
  circle A3 centre (-24.175, -46) radius 2.9173
  point P0 (0, 0)
extrude "Extrusion23" add sketch "Sketch30" against normal blind 7.5 contours A0 | A1 | A2 | A3
sketch "Sketch31" plane through (0, 7.5, 0) normal (0, 1, 0) x (1, 0, 0)
  line L0 (-45, -42.5) -> (-45, -32.5) construction
  circle A0 centre (-50, -37.5) radius 1.65 construction
  line L1 (-45, -37.5) -> (-50, -37.5) construction
  circle A1 centre (-50, -12.5) radius 1.65 construction
  line L2 (-50, -12.5) -> (-45, -12.5) construction
  line L3 (-40, -32.5) -> (-40, -42.5) construction
  line L4 (-40, -42.5) -> (-45, -32.5) construction
  line L5 (-45, -32.5) -> (-40, -32.5) construction
  line L6 (-40, -32.5) -> (-45, -42.5) construction
  line L7 (-50, -37.5) -> (-42.5, -37.5) construction
  line L8 (-42.5, -37.5) -> (-42.5, -12.5) construction
  line L9 (-45, -17.5) -> (-40, -17.5)
  line L10 (-40, -17.5) -> (-40, -7.5)
  line L11 (-40, -7.5) -> (-45, -7.5)
  line L12 (-45, -7.5) -> (-45, -17.5)
  line L13 (-45, -17.5) -> (-40, -7.5) construction
  line L14 (-40, -17.5) -> (-45, -7.5) construction
  point P0 (0, 0)
  dimension "d146" = 5
  dimension "d147" = 10
  dimension "d148" = 5
  dimension "d149" = 10
extrude "Extrusion24" add sketch "Sketch31" along normal blind 17.5
sketch "Sketch32" plane through (-45, 7.5, 7.5) normal (-1, 0, 0) x (0, 0, 1)
  line L0 (10, 17.5) -> (0, 17.5) construction
  line L1 (5, 17.5) -> (5, 12.5) construction
  point P0 (-7.5, -7.5)
  dimension "d152" = 5
hole "Hole6" at (-45, 20, 12.5) direction (1, 0, 0) diameter 7 depth 8 tip angle 118
sketch "Sketch33" plane through (0, 25, 0) normal (0, 1, 0) x (1, 0, 0)
  line L0 (-45, -32.5) -> (-40, -32.5) projected
  line L1 (-40, -32.5) -> (-40, -42.5) projected
  line L2 (-45, -32.5) -> (-40, -32.5)
  line L3 (-40, -32.5) -> (-40, -42.5)
  line L4 (-40, -42.5) -> (-45, -42.5)
  line L5 (-45, -42.5) -> (-45, -32.5)
  point P0 (0, 0)
extrude "Extrusion25" cut sketch "Sketch33" against normal blind 17.5
sketch "Sketch34" plane through (0, 7.5, 0) normal (0, 1, 0) x (1, 0, 0)
  line L0 (-280, -50) -> (0, -50) projected
  line L1 (-176.6721, -50) -> (-309.3974, -50)
  line L2 (-309.3974, -50) -> (-309.3974, 41.697)
  line L3 (-309.3974, 41.697) -> (-176.6721, 41.697)
  line L4 (-176.6721, 41.697) -> (-176.6721, -50)
  line L5 (-176.6721, 41.697) -> (-320.285, 41.697)
  line L6 (-320.285, 41.697) -> (-320.285, -112.2851)
  line L7 (-320.285, -112.2851) -> (-176.6721, -112.2851)
  line L8 (-176.6721, -112.2851) -> (-176.6721, 41.697)
  point P0 (0, 0)
extrude "Extrusion26" cut sketch "Sketch34" against normal blind 170.5
sketch "Sketch35" plane through (-176.6721, 7.5, 0) normal (-1, 0, 0) x (0, 0, 1)
  line L0 (42.5, -7.5) -> (7.5, -7.5) construction
  line L1 (0, 0) -> (7.5, -7.5) construction
  line L2 (7.5, -7.5) -> (7.5, 0) construction
  line L3 (21.825, -7.5) -> (0, -7.5) construction
  line L4 (7.5, 0) -> (0, -7.5) construction
  line L5 (5.625, -5.625) -> (1.875, -5.625)
  line L6 (1.875, -5.625) -> (1.875, -1.875)
  line L7 (1.875, -1.875) -> (5.625, -1.875)
  line L8 (5.625, -1.875) -> (5.625, -5.625)
  line L9 (5.625, -5.625) -> (1.875, -1.875) construction
  line L10 (1.875, -5.625) -> (5.625, -1.875) construction
  line L11 (42.5, -7.5) -> (50, 0) construction
  line L12 (50, 0) -> (50, -7.5) construction
  line L13 (50, -7.5) -> (42.5, 0) construction
  line L14 (0, 0) -> (50, 0) construction
  line L15 (48.125, -5.625) -> (44.375, -5.625)
  line L16 (44.375, -5.625) -> (44.375, -1.875)
  line L17 (44.375, -1.875) -> (48.125, -1.875)
  line L18 (48.125, -1.875) -> (48.125, -5.625)
  line L19 (48.125, -5.625) -> (44.375, -1.875) construction
  line L20 (44.375, -5.625) -> (48.125, -1.875) construction
  point P0 (3.75, -3.75)
  point P1 (46.25, -3.75)
  dimension "d164" = 3.75
  dimension "d165" = 3.75
  dimension "d166" = 3.75
  dimension "d167" = 3.75
extrude "Extrusion27" add sketch "Sketch35" along normal blind 10
properties part number "mtv_frame(BrakeInBack)1-13"
